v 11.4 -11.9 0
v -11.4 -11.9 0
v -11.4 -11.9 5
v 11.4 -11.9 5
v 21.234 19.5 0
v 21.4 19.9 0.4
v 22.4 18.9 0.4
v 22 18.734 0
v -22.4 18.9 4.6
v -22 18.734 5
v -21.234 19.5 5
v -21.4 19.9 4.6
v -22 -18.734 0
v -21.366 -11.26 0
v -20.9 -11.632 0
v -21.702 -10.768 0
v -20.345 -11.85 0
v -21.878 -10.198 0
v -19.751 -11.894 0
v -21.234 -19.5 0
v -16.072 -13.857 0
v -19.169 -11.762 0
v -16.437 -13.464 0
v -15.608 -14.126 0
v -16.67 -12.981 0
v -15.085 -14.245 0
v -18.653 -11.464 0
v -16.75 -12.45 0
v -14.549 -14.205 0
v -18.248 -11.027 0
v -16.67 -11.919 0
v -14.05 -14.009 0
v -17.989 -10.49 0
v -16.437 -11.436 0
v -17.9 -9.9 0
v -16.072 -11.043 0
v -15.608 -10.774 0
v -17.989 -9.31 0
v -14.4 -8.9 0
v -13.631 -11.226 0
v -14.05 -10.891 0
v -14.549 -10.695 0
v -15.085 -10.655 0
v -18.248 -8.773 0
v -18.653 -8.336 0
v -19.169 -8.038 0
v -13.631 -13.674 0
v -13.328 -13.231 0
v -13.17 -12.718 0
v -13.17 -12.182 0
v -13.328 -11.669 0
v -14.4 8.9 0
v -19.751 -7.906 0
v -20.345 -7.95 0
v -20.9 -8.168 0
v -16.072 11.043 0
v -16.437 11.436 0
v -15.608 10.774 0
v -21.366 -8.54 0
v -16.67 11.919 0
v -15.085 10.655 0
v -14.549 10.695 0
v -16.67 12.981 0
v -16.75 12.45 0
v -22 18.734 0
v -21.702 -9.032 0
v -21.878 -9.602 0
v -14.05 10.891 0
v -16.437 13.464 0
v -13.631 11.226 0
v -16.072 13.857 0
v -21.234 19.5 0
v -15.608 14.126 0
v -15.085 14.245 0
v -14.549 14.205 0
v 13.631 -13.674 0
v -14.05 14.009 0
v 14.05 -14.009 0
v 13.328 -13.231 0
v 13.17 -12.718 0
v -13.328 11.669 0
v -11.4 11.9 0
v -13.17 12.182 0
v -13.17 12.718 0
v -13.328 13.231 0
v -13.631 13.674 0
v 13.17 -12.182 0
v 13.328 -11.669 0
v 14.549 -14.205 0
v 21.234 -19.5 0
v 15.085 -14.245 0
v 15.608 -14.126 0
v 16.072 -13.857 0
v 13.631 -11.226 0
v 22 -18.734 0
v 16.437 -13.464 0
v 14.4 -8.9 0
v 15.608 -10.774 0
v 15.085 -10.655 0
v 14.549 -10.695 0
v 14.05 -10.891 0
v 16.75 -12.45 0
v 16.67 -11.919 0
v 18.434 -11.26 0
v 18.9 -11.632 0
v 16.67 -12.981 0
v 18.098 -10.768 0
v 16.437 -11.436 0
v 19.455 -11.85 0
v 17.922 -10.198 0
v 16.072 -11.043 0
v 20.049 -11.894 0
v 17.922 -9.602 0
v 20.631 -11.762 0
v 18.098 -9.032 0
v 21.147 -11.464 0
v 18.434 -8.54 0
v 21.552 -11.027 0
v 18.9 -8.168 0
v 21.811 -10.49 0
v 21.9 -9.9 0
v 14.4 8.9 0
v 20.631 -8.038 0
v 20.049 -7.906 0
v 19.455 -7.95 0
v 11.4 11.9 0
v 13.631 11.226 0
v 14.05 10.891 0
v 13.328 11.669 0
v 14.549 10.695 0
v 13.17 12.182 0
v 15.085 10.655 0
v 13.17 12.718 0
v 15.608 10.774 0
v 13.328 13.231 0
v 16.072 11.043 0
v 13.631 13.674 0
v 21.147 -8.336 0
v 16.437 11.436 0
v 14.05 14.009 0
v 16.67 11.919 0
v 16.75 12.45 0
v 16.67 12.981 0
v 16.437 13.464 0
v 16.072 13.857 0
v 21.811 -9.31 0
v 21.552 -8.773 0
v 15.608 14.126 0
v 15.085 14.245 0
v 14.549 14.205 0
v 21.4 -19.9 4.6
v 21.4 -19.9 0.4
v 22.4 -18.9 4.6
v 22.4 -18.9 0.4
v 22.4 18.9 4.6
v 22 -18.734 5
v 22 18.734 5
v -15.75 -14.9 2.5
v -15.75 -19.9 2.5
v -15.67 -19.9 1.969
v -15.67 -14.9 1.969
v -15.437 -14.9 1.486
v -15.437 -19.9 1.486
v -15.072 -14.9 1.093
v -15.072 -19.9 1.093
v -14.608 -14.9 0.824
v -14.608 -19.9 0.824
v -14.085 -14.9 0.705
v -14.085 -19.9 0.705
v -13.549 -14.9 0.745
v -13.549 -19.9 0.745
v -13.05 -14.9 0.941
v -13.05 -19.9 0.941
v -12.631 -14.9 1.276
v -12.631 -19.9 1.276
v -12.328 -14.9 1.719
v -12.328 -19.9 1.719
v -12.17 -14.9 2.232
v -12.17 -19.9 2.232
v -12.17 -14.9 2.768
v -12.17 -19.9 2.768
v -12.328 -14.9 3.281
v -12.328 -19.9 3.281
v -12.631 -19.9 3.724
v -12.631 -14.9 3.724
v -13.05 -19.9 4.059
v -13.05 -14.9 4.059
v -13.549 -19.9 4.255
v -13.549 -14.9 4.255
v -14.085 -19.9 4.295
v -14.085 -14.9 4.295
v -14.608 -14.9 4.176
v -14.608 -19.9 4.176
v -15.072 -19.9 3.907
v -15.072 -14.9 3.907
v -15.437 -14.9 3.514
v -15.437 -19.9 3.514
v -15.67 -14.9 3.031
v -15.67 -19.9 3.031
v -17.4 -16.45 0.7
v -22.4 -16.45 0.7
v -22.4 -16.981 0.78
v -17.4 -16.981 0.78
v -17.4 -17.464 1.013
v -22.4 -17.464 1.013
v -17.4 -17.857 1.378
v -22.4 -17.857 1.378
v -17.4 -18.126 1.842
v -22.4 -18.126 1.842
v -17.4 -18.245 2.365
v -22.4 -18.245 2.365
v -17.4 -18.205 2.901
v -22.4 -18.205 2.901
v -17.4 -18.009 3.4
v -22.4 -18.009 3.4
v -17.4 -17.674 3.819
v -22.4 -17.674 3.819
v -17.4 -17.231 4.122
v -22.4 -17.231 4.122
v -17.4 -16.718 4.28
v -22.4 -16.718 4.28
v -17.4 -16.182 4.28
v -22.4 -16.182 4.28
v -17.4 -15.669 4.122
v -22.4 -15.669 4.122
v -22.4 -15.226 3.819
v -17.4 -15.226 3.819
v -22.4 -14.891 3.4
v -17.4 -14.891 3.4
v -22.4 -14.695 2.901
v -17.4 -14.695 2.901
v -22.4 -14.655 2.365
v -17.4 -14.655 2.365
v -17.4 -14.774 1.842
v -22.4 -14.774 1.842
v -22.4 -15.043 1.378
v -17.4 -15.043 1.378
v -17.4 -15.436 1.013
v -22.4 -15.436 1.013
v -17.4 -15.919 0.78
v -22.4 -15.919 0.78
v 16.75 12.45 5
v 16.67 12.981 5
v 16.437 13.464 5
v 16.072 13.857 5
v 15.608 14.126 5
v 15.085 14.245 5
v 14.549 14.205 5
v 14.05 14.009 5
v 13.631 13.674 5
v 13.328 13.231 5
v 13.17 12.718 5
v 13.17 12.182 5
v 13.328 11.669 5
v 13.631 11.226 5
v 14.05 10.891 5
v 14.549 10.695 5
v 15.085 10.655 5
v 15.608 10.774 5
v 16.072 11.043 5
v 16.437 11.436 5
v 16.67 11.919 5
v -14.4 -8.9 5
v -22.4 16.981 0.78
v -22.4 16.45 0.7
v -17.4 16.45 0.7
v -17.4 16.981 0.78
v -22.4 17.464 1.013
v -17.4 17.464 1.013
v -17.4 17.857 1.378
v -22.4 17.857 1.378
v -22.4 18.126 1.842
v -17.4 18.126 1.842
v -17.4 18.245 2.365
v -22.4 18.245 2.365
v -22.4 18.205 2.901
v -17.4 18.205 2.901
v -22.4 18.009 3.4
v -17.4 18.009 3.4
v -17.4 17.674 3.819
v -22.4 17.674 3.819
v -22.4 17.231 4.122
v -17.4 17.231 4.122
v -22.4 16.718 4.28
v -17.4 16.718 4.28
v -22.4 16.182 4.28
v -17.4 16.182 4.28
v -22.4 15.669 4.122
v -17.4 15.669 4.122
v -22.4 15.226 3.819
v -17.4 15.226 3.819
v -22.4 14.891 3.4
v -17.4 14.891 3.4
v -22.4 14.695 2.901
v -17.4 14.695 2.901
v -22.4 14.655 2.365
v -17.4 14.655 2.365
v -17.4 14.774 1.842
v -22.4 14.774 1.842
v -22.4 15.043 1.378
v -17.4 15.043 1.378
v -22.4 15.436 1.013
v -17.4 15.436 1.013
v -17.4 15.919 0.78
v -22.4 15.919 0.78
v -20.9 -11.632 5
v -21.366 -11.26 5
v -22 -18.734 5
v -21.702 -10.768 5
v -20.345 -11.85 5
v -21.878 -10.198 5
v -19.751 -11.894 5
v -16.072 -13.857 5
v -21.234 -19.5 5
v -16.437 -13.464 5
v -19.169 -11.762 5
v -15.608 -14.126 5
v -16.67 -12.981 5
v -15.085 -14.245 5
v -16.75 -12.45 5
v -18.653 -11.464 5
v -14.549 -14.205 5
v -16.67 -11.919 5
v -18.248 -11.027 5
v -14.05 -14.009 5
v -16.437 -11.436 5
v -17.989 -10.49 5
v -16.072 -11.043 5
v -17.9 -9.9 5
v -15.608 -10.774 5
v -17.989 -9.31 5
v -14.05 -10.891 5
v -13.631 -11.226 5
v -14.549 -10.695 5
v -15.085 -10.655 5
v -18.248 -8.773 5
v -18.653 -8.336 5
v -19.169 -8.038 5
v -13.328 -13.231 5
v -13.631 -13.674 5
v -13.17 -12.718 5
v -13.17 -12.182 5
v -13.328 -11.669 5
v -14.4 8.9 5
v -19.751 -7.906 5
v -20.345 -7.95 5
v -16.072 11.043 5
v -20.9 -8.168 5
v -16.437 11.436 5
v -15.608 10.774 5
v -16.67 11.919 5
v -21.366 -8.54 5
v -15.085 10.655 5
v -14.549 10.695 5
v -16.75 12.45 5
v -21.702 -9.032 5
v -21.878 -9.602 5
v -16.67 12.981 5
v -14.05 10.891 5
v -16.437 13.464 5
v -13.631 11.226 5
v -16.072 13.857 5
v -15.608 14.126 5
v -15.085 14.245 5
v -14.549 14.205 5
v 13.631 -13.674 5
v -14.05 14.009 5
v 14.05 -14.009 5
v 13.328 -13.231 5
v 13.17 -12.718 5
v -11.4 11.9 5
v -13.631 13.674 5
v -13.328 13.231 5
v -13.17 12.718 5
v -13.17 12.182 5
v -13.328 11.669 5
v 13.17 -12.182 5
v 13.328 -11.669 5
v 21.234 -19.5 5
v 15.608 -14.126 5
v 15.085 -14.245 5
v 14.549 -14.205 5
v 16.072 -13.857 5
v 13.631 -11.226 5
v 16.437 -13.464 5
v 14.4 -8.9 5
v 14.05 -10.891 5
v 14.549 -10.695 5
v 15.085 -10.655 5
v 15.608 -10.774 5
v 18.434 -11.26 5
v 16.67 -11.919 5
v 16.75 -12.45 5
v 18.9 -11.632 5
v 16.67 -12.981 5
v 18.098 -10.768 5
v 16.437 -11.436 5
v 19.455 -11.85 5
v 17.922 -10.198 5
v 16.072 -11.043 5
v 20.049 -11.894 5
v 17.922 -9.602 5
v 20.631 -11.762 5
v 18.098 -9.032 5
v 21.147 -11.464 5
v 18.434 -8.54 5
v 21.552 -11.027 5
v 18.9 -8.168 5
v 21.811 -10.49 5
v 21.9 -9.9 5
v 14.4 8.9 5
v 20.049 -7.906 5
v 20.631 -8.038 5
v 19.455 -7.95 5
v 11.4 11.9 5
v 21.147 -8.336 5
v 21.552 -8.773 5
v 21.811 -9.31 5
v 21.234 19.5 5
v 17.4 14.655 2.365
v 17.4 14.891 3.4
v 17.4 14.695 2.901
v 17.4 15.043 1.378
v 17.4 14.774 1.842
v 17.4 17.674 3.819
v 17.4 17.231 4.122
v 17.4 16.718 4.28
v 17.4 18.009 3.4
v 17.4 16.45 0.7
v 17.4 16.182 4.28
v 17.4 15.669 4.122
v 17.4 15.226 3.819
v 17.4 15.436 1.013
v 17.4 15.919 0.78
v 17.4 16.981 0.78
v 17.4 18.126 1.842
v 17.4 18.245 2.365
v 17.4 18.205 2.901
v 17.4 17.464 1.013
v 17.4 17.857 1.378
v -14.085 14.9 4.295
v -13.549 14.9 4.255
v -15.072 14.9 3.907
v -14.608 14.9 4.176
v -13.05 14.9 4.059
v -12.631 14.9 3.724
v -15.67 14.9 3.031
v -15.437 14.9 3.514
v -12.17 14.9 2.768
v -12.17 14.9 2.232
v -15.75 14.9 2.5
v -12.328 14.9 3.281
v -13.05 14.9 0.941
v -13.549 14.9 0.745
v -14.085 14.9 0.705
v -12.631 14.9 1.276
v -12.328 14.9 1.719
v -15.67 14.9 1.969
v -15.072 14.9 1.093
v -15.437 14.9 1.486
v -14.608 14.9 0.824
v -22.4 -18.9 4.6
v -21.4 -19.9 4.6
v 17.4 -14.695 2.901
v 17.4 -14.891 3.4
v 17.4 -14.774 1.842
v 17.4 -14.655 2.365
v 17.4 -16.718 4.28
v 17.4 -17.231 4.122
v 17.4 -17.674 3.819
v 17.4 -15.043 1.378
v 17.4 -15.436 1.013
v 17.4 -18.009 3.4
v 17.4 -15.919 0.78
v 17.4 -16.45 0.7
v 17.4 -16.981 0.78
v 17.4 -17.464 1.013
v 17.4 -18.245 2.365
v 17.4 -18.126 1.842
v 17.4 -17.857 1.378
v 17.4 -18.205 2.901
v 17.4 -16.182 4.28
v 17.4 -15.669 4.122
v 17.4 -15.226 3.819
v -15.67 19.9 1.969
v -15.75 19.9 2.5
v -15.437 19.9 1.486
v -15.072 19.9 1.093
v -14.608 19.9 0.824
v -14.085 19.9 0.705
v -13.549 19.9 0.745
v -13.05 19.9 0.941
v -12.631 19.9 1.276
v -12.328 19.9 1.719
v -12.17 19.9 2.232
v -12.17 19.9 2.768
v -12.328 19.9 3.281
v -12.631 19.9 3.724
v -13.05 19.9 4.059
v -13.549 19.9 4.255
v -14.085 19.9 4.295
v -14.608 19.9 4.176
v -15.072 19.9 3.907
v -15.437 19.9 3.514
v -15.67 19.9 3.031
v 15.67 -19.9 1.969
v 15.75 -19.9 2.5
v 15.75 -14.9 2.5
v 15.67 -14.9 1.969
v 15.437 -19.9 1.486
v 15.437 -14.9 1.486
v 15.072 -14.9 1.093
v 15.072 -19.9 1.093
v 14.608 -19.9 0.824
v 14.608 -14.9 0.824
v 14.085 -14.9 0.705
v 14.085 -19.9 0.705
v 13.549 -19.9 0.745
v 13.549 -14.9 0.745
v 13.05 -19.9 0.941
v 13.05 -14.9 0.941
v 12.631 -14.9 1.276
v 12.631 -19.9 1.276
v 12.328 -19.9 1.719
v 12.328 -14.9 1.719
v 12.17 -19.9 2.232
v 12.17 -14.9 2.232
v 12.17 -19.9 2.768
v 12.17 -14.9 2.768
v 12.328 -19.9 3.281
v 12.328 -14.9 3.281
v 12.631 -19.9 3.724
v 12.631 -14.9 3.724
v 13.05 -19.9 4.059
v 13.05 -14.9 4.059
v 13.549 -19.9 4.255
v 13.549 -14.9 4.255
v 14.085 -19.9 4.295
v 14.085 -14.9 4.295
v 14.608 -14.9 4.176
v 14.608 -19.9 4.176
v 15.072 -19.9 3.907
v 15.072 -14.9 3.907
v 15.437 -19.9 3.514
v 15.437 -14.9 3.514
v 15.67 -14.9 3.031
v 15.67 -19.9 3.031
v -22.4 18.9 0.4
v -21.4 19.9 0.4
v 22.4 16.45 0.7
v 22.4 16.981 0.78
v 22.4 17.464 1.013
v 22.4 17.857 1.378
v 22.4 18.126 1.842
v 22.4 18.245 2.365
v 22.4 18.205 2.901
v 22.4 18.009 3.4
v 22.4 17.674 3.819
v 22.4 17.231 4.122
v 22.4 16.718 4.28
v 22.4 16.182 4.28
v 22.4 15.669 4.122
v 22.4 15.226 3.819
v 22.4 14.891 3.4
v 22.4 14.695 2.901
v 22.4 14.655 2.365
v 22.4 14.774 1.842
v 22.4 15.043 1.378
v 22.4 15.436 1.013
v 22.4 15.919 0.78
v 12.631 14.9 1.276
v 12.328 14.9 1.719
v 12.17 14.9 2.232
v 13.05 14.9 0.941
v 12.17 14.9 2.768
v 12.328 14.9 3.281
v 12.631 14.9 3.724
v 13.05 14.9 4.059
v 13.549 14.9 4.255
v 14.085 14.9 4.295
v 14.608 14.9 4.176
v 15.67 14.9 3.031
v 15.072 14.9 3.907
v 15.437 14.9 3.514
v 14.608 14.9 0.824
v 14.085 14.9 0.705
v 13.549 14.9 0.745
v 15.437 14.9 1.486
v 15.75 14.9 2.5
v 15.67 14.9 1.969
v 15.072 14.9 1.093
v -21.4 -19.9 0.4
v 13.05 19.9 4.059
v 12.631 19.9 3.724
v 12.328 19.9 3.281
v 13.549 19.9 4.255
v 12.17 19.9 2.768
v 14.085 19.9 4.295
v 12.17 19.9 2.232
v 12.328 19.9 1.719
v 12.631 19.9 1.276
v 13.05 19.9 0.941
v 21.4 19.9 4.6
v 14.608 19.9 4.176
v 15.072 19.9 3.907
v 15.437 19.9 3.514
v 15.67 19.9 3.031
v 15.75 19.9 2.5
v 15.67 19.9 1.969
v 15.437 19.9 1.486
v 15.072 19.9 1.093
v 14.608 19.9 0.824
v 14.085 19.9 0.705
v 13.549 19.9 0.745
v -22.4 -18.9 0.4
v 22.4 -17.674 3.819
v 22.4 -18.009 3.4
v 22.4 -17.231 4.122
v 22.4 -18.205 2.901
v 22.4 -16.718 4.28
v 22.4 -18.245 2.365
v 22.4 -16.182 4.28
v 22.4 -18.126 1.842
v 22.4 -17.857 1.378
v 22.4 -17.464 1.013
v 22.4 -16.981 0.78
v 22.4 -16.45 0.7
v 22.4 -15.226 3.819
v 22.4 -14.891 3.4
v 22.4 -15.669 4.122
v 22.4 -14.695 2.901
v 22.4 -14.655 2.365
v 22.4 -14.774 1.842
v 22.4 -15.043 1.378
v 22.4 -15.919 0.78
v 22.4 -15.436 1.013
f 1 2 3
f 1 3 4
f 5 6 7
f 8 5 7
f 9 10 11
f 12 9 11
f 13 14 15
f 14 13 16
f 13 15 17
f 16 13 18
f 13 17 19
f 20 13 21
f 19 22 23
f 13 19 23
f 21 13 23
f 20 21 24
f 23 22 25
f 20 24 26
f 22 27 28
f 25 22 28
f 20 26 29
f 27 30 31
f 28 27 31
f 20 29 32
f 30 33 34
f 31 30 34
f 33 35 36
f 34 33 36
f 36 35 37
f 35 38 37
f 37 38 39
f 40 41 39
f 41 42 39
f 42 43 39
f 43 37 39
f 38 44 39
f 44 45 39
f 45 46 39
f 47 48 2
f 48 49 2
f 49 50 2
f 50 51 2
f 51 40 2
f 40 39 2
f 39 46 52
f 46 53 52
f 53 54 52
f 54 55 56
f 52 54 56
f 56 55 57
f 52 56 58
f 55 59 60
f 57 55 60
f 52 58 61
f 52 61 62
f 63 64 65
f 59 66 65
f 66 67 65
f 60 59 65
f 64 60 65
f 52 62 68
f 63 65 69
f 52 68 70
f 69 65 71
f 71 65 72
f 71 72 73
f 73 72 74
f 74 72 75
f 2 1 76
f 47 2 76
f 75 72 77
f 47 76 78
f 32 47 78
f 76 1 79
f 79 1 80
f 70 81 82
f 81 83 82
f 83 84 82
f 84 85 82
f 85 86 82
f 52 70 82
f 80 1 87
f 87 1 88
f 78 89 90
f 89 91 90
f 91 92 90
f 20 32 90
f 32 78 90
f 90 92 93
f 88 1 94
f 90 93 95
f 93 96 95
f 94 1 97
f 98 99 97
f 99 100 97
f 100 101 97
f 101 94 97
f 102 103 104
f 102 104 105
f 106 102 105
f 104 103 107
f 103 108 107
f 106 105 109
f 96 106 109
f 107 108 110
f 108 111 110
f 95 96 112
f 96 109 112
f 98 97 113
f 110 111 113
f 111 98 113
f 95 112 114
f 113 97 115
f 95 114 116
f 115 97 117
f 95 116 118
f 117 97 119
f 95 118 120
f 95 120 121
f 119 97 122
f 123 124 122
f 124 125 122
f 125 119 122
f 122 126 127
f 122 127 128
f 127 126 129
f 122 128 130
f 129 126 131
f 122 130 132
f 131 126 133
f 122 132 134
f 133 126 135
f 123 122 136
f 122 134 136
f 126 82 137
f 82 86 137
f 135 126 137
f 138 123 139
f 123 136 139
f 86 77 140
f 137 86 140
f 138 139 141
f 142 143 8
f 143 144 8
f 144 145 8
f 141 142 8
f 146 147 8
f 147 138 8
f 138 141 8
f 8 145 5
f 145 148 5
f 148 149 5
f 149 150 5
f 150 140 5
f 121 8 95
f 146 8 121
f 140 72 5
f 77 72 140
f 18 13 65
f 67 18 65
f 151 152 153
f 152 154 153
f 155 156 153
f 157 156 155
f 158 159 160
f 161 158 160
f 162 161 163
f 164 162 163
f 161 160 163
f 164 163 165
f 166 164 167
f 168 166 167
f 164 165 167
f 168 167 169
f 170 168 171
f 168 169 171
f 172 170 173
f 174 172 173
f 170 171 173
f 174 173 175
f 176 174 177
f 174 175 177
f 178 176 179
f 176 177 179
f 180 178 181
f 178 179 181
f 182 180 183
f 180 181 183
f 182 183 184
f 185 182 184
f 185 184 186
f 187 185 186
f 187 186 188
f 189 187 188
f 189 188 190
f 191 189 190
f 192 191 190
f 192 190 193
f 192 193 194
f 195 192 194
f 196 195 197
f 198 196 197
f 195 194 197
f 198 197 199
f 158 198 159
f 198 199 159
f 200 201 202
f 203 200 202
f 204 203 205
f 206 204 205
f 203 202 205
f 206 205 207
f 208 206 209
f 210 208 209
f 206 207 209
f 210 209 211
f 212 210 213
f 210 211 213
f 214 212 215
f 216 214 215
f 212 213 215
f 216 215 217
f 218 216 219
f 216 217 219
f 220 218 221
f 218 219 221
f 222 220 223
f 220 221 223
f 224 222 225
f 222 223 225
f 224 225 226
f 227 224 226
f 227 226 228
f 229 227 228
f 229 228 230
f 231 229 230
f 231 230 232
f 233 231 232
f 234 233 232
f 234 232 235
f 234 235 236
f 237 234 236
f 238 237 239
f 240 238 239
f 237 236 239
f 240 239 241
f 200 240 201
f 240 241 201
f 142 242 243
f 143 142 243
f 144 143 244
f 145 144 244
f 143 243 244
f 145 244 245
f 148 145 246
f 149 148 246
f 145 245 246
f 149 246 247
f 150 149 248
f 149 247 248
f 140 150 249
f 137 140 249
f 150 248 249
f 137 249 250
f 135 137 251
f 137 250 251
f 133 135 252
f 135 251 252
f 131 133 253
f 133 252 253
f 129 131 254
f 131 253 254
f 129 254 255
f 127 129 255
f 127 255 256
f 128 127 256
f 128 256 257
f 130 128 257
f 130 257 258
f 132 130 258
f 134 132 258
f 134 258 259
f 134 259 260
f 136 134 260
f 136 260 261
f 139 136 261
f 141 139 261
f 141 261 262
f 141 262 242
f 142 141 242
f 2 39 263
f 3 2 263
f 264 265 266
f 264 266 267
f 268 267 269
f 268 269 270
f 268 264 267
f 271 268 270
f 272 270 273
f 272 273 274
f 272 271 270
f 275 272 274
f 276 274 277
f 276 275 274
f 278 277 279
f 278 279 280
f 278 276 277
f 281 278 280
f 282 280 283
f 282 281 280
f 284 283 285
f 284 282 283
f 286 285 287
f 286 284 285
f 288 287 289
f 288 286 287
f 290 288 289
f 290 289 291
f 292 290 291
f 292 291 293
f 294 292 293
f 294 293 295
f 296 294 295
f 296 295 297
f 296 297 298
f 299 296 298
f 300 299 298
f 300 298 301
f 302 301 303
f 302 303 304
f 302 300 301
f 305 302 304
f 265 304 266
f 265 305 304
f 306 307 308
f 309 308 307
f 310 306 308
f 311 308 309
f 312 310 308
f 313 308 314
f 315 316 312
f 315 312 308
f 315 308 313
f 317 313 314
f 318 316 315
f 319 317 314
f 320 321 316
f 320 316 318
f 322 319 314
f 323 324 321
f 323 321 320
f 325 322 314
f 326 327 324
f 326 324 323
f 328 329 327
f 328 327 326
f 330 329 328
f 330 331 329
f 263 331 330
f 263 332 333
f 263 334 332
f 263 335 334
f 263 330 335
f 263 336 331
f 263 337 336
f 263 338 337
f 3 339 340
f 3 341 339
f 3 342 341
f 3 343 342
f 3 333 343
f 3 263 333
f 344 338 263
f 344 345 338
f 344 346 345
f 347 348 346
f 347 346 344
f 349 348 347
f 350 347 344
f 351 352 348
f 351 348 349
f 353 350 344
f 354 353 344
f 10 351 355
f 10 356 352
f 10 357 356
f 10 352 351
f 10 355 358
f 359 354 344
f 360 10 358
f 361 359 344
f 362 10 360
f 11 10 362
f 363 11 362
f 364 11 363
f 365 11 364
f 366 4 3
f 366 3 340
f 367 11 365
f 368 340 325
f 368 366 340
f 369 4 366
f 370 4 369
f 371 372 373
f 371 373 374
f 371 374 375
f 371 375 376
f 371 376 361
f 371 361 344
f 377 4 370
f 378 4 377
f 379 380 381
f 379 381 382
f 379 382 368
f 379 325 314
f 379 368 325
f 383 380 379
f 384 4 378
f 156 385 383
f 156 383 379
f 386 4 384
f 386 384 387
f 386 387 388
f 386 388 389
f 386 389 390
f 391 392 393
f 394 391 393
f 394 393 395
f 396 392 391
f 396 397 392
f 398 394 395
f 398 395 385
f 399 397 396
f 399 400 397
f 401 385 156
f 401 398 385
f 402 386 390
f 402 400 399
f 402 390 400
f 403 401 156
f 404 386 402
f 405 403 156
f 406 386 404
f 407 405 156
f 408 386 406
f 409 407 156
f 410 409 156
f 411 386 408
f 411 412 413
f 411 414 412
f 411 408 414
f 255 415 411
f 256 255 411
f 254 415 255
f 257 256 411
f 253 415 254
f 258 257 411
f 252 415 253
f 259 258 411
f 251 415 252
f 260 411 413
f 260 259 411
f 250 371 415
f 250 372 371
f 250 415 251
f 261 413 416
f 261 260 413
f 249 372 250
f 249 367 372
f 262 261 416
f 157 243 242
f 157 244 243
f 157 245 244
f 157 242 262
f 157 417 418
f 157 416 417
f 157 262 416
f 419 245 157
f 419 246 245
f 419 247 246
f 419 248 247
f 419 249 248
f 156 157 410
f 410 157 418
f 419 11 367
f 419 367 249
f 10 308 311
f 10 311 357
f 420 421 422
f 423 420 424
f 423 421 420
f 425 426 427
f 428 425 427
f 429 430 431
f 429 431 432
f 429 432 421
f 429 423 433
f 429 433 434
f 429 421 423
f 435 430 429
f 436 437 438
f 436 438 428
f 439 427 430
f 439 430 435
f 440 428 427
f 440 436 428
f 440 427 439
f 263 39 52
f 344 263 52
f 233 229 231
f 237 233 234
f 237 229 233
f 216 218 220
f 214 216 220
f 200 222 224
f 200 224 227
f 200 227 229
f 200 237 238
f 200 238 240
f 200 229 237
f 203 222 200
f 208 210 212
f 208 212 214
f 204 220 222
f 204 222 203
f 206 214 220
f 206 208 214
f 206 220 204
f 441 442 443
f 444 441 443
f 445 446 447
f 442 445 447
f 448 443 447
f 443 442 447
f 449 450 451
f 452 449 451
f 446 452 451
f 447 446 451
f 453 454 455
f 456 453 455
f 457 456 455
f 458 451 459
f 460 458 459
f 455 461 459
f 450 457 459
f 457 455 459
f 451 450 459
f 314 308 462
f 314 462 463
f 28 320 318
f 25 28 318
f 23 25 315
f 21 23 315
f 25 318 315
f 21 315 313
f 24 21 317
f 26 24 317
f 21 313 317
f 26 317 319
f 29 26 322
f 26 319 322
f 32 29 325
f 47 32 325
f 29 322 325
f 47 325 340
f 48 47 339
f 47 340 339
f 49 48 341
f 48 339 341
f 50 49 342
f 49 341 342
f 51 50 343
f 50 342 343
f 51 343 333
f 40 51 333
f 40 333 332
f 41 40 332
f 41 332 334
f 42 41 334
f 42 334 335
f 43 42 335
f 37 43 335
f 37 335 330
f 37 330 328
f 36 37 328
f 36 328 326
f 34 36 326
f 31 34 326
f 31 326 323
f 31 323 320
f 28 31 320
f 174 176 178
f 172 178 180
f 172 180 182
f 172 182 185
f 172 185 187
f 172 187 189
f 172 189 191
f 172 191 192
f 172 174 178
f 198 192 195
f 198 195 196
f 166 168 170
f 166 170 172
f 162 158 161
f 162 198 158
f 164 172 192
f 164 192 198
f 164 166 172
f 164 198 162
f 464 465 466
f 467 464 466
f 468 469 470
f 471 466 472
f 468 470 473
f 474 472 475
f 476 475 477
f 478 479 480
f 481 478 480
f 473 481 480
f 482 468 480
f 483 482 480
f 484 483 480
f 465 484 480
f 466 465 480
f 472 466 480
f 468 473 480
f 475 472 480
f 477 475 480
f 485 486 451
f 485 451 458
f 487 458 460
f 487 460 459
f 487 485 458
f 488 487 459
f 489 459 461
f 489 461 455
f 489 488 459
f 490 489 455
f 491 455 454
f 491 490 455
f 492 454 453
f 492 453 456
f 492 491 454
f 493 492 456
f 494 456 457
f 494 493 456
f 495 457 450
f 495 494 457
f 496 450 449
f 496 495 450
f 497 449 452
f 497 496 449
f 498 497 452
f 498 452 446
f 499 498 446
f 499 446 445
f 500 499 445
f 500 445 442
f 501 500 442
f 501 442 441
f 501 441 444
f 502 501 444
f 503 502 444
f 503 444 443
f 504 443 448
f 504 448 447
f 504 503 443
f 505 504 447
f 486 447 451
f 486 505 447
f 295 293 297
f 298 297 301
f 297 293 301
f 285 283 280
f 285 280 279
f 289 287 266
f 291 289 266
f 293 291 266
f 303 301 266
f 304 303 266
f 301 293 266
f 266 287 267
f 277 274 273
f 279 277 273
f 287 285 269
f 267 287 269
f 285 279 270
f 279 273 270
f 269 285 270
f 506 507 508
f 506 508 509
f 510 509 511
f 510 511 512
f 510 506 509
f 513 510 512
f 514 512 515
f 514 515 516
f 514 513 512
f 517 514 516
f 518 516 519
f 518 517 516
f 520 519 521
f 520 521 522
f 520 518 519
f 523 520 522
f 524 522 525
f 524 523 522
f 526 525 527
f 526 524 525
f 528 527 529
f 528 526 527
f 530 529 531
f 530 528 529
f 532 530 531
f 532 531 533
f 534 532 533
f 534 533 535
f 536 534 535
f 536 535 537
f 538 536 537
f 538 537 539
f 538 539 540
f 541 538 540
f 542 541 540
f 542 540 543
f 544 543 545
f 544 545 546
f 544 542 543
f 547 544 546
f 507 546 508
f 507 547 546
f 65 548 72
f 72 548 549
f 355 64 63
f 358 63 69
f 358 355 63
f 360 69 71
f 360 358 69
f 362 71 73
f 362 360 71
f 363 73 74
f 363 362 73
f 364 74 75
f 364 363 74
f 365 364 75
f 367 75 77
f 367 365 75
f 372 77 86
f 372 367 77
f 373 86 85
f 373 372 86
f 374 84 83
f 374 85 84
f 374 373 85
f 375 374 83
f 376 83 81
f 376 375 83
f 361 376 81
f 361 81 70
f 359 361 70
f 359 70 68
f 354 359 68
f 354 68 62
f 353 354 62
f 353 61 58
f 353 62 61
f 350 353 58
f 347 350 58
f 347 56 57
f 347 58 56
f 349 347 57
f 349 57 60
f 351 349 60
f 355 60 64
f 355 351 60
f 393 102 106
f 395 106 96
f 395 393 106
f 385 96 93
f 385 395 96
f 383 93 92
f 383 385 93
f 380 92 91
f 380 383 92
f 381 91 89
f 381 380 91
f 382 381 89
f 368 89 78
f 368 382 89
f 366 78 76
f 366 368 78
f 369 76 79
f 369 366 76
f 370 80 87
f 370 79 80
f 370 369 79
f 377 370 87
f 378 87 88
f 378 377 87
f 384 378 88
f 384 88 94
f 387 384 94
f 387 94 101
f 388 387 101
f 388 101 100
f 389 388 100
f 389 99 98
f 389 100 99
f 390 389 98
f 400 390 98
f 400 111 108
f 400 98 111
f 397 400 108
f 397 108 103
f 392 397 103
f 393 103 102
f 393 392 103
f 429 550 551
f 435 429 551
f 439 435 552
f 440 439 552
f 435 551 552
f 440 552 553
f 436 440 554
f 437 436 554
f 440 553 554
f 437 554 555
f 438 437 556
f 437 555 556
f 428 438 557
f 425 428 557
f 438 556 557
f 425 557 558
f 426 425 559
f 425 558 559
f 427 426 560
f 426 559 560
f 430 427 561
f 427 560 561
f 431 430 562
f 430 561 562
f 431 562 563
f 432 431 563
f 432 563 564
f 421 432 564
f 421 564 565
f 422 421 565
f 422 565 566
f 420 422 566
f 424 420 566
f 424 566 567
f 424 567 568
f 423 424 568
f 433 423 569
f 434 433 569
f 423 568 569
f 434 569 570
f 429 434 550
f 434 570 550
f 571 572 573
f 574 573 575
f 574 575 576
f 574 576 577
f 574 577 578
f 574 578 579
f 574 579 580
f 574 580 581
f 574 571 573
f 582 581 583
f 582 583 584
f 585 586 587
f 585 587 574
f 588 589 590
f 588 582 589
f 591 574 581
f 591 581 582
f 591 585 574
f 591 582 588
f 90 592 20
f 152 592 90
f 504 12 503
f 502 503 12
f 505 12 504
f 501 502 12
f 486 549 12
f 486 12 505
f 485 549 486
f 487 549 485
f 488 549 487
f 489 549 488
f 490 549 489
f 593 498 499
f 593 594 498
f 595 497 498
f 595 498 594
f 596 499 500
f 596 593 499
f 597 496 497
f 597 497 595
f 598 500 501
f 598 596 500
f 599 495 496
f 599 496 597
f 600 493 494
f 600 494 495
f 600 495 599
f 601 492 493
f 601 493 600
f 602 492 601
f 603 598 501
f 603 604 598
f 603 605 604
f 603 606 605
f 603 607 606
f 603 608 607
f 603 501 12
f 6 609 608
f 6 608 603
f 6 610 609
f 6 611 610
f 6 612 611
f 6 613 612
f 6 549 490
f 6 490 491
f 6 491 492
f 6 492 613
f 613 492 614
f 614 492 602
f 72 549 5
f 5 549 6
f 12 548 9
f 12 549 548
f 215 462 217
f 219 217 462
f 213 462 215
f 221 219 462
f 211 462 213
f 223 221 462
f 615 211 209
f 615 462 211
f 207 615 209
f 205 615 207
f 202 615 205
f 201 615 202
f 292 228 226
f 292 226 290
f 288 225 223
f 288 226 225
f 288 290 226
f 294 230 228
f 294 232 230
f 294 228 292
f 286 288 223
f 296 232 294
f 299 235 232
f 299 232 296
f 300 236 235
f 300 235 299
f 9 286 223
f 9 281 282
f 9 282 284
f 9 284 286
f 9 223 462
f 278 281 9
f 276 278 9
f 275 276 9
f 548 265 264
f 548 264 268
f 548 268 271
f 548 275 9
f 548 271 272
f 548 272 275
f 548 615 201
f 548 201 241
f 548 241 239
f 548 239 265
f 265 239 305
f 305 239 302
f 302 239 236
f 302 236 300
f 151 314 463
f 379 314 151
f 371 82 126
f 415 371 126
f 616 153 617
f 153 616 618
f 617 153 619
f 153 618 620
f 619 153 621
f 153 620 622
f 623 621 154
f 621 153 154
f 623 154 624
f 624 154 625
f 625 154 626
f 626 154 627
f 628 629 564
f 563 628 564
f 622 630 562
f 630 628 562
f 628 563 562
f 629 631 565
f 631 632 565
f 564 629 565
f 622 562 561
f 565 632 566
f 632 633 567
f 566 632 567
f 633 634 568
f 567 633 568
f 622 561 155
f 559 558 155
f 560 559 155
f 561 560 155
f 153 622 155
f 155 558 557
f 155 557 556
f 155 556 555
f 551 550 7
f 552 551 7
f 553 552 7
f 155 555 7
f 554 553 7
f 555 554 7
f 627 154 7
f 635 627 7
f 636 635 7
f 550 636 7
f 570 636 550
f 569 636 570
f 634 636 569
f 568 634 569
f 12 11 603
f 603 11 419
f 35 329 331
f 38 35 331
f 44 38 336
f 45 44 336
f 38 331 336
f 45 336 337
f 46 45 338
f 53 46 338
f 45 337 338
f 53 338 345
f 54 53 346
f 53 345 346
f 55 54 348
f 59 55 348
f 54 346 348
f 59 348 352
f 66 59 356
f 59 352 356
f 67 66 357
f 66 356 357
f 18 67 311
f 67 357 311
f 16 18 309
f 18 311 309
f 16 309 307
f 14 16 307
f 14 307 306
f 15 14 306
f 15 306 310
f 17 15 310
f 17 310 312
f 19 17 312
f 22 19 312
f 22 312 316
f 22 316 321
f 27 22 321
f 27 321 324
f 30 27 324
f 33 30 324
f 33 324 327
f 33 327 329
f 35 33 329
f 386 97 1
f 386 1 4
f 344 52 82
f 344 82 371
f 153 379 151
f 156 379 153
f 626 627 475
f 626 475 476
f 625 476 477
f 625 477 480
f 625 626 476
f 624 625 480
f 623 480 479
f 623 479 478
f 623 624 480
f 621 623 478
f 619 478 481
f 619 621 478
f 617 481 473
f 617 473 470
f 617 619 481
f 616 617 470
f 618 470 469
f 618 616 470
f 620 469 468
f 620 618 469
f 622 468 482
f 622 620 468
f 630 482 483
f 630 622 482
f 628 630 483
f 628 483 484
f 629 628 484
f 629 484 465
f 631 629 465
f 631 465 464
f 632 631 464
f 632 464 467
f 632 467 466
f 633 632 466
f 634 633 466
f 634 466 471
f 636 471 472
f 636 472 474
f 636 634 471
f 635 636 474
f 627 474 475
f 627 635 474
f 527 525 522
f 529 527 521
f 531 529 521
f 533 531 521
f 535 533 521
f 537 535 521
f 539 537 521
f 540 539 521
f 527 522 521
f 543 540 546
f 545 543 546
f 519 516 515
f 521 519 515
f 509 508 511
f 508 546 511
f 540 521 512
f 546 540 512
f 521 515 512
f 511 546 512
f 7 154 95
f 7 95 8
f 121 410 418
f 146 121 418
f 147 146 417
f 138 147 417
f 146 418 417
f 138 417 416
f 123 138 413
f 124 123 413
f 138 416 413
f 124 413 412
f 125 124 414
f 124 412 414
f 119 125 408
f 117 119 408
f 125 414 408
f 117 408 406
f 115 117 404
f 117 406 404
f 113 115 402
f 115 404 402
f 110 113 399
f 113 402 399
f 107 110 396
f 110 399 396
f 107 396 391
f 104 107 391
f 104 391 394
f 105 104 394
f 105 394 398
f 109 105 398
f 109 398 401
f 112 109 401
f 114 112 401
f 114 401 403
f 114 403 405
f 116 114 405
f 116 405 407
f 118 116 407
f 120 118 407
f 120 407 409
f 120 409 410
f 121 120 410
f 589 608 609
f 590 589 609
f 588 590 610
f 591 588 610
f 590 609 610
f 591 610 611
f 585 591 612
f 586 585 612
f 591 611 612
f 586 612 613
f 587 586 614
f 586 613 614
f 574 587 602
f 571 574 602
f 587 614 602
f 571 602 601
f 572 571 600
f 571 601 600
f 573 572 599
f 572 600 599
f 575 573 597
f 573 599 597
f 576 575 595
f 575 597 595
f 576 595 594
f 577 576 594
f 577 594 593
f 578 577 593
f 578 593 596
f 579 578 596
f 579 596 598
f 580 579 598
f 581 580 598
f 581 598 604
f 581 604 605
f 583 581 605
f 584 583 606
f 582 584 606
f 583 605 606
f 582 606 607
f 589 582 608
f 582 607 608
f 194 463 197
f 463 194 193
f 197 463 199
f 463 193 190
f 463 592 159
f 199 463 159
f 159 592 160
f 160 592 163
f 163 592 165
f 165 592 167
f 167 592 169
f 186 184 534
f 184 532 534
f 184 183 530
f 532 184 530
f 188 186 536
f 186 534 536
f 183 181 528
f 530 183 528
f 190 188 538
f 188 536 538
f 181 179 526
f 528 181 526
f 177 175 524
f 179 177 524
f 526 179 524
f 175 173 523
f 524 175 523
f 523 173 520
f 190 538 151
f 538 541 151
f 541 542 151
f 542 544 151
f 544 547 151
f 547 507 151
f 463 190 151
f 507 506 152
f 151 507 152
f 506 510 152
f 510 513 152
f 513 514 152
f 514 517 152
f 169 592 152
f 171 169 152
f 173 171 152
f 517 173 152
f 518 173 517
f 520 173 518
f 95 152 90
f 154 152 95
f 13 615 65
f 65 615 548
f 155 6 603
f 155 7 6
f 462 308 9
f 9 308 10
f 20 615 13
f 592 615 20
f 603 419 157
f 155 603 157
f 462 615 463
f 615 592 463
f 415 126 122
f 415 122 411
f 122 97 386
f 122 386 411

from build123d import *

# Parameters (mm, degrees)
SKETCH2_W               = 44.8
SKETCH2_H               = 39.8
SKETCH2_W_2             = 28.8
SKETCH2_H_2             = 23.8
BOSS_EXTRUDE1_DEPTH     = 5
CHAMFER1_SIZE           = 1
CHAMFER2_SIZE           = 3
SKETCH3_R               = 1.8
CUT_EXTRUDE1_DEPTH      = 6
SKETCH4_R               = 1.8
CUT_EXTRUDE2_DEPTH      = 5
SKETCH5_R               = 1.8
CUT_EXTRUDE3_DEPTH      = 5
MIRROR2_COPY_1_SKETCH_R = 1.8
MIRROR2_COPY_1_DEPTH    = 6
MIRROR2_COPY_2_SKETCH_R = 1.8
MIRROR2_COPY_2_DEPTH    = 5
MIRROR2_COPY_3_SKETCH_R = 1.8
MIRROR2_COPY_3_DEPTH    = 5
SKETCH6_R               = 2
CUT_EXTRUDE4_DEPTH      = 6
CHAMFER3_SIZE           = 0.4


with BuildPart() as part:
    # Sketch2 → Boss-Extrude1 (new body)
    with BuildSketch(Plane.XY):
        Rectangle(SKETCH2_W, SKETCH2_H)
        Rectangle(SKETCH2_W_2, SKETCH2_H_2, mode=Mode.SUBTRACT)
    extrude(amount=BOSS_EXTRUDE1_DEPTH)

    # Chamfer1
    chamfer1_edges = [part.edges().sort_by_distance(p)[0] for p in [
        (-22.4, 19.9, 2.5),
        (22.4, 19.9, 2.5),
        (22.4, -19.9, 2.5),
        (-22.4, -19.9, 2.5),
    ]]
    chamfer(chamfer1_edges, length=CHAMFER1_SIZE)

    # Chamfer2
    chamfer2_edges = [part.edges().sort_by_distance(p)[0] for p in [
        (-14.4, 11.9, 2.5),
        (-14.4, -11.9, 2.5),
        (14.4, -11.9, 2.5),
        (14.4, 11.9, 2.5),
    ]]
    chamfer(chamfer2_edges, length=CHAMFER2_SIZE)

    # Sketch3 → Cut-Extrude1 (cut, through all)
    with BuildSketch(Plane.XY.offset(5)):
        with Locations((14.95, 12.45)):
            Circle(SKETCH3_R)
    cut_extrude1 = extrude(amount=-CUT_EXTRUDE1_DEPTH, mode=Mode.SUBTRACT)

    # Sketch4 → Cut-Extrude2 (cut)
    with BuildSketch(Plane(origin=(0, 19.9, 0), x_dir=(1, 0, 0), z_dir=(0, 1, 0))):
        with Locations((13.95, -2.5)):
            Circle(SKETCH4_R)
    cut_extrude2 = extrude(amount=-CUT_EXTRUDE2_DEPTH, mode=Mode.SUBTRACT)

    # Sketch5 → Cut-Extrude3 (cut)
    with BuildSketch(Plane(origin=(22.4, 0, 0), x_dir=(0, 0, -1), z_dir=(1, 0, 0))):
        with Locations((-2.5, 16.45)):
            Circle(SKETCH5_R)
    cut_extrude3 = extrude(amount=-CUT_EXTRUDE3_DEPTH, mode=Mode.SUBTRACT)

    # Mirror1: Cut-Extrude1, Cut-Extrude2, Cut-Extrude3 across plane
    add(cut_extrude1.mirror(Plane.ZX), mode=Mode.SUBTRACT)
    add(cut_extrude2.mirror(Plane.ZX), mode=Mode.SUBTRACT)
    add(cut_extrude3.mirror(Plane.ZX), mode=Mode.SUBTRACT)

    # Mirror2: Cut-Extrude1, Cut-Extrude2, Cut-Extrude3 across plane
    add(cut_extrude1.mirror(Plane(origin=(0, 0, 0), x_dir=(0, 0, 1), z_dir=(1, 0, 0))), mode=Mode.SUBTRACT)
    add(cut_extrude2.mirror(Plane(origin=(0, 0, 0), x_dir=(0, 0, 1), z_dir=(1, 0, 0))), mode=Mode.SUBTRACT)
    add(cut_extrude3.mirror(Plane(origin=(0, 0, 0), x_dir=(0, 0, 1), z_dir=(1, 0, 0))), mode=Mode.SUBTRACT)

    # Mirror2 copy 1 sketch → Mirror2 copy 1 (cut, through all)
    with BuildSketch(Plane(origin=(0, 0, 5), x_dir=(-1, 0, 0), z_dir=(0, 0, 1))):
        with Locations((14.95, 12.45)):
            Circle(MIRROR2_COPY_1_SKETCH_R)
    extrude(amount=-MIRROR2_COPY_1_DEPTH, mode=Mode.SUBTRACT)

    # Mirror2 copy 2 sketch → Mirror2 copy 2 (cut)
    with BuildSketch(Plane(origin=(0, -19.9, 0), x_dir=(-1, 0, 0), z_dir=(0, -1, 0))):
        with Locations((13.95, -2.5)):
            Circle(MIRROR2_COPY_2_SKETCH_R)
    extrude(amount=-MIRROR2_COPY_2_DEPTH, mode=Mode.SUBTRACT)

    # Mirror2 copy 3 sketch → Mirror2 copy 3 (cut)
    with BuildSketch(Plane(origin=(-22.4, 0, 0), x_dir=(0, 0, -1), z_dir=(-1, 0, 0))):
        with Locations((-2.5, 16.45)):
            Circle(MIRROR2_COPY_3_SKETCH_R)
    extrude(amount=-MIRROR2_COPY_3_DEPTH, mode=Mode.SUBTRACT)

    # Sketch6 → Cut-Extrude4 (cut, through all)
    with BuildSketch(Plane.XY.offset(5)):
        with Locations((19.9, -9.9)):
            Circle(SKETCH6_R)
        with Locations((-19.9, -9.9)):
            Circle(SKETCH6_R)
    extrude(amount=-CUT_EXTRUDE4_DEPTH, mode=Mode.SUBTRACT)

    # Chamfer3
    chamfer3_edges = [part.edges().sort_by_distance(p)[0] for p in [
        (0, -19.9, 0),
        (0, -19.9, 5),
        (-22.4, 0, 0),
        (0, 19.9, 0),
        (22.4, 0, 0),
        (-21.9, 19.4, 0),
        (21.9, 19.4, 0),
        (21.9, -19.4, 0),
        (-21.9, -19.4, 0),
        (-22.4, 0, 5),
        (22.4, 0, 5),
        (0, 19.9, 5),
        (-21.9, 19.4, 5),
        (21.9, 19.4, 5),
        (21.9, -19.4, 5),
        (-21.9, -19.4, 5),
    ]]
    chamfer(chamfer3_edges, length=CHAMFER3_SIZE)


solid = part.part
